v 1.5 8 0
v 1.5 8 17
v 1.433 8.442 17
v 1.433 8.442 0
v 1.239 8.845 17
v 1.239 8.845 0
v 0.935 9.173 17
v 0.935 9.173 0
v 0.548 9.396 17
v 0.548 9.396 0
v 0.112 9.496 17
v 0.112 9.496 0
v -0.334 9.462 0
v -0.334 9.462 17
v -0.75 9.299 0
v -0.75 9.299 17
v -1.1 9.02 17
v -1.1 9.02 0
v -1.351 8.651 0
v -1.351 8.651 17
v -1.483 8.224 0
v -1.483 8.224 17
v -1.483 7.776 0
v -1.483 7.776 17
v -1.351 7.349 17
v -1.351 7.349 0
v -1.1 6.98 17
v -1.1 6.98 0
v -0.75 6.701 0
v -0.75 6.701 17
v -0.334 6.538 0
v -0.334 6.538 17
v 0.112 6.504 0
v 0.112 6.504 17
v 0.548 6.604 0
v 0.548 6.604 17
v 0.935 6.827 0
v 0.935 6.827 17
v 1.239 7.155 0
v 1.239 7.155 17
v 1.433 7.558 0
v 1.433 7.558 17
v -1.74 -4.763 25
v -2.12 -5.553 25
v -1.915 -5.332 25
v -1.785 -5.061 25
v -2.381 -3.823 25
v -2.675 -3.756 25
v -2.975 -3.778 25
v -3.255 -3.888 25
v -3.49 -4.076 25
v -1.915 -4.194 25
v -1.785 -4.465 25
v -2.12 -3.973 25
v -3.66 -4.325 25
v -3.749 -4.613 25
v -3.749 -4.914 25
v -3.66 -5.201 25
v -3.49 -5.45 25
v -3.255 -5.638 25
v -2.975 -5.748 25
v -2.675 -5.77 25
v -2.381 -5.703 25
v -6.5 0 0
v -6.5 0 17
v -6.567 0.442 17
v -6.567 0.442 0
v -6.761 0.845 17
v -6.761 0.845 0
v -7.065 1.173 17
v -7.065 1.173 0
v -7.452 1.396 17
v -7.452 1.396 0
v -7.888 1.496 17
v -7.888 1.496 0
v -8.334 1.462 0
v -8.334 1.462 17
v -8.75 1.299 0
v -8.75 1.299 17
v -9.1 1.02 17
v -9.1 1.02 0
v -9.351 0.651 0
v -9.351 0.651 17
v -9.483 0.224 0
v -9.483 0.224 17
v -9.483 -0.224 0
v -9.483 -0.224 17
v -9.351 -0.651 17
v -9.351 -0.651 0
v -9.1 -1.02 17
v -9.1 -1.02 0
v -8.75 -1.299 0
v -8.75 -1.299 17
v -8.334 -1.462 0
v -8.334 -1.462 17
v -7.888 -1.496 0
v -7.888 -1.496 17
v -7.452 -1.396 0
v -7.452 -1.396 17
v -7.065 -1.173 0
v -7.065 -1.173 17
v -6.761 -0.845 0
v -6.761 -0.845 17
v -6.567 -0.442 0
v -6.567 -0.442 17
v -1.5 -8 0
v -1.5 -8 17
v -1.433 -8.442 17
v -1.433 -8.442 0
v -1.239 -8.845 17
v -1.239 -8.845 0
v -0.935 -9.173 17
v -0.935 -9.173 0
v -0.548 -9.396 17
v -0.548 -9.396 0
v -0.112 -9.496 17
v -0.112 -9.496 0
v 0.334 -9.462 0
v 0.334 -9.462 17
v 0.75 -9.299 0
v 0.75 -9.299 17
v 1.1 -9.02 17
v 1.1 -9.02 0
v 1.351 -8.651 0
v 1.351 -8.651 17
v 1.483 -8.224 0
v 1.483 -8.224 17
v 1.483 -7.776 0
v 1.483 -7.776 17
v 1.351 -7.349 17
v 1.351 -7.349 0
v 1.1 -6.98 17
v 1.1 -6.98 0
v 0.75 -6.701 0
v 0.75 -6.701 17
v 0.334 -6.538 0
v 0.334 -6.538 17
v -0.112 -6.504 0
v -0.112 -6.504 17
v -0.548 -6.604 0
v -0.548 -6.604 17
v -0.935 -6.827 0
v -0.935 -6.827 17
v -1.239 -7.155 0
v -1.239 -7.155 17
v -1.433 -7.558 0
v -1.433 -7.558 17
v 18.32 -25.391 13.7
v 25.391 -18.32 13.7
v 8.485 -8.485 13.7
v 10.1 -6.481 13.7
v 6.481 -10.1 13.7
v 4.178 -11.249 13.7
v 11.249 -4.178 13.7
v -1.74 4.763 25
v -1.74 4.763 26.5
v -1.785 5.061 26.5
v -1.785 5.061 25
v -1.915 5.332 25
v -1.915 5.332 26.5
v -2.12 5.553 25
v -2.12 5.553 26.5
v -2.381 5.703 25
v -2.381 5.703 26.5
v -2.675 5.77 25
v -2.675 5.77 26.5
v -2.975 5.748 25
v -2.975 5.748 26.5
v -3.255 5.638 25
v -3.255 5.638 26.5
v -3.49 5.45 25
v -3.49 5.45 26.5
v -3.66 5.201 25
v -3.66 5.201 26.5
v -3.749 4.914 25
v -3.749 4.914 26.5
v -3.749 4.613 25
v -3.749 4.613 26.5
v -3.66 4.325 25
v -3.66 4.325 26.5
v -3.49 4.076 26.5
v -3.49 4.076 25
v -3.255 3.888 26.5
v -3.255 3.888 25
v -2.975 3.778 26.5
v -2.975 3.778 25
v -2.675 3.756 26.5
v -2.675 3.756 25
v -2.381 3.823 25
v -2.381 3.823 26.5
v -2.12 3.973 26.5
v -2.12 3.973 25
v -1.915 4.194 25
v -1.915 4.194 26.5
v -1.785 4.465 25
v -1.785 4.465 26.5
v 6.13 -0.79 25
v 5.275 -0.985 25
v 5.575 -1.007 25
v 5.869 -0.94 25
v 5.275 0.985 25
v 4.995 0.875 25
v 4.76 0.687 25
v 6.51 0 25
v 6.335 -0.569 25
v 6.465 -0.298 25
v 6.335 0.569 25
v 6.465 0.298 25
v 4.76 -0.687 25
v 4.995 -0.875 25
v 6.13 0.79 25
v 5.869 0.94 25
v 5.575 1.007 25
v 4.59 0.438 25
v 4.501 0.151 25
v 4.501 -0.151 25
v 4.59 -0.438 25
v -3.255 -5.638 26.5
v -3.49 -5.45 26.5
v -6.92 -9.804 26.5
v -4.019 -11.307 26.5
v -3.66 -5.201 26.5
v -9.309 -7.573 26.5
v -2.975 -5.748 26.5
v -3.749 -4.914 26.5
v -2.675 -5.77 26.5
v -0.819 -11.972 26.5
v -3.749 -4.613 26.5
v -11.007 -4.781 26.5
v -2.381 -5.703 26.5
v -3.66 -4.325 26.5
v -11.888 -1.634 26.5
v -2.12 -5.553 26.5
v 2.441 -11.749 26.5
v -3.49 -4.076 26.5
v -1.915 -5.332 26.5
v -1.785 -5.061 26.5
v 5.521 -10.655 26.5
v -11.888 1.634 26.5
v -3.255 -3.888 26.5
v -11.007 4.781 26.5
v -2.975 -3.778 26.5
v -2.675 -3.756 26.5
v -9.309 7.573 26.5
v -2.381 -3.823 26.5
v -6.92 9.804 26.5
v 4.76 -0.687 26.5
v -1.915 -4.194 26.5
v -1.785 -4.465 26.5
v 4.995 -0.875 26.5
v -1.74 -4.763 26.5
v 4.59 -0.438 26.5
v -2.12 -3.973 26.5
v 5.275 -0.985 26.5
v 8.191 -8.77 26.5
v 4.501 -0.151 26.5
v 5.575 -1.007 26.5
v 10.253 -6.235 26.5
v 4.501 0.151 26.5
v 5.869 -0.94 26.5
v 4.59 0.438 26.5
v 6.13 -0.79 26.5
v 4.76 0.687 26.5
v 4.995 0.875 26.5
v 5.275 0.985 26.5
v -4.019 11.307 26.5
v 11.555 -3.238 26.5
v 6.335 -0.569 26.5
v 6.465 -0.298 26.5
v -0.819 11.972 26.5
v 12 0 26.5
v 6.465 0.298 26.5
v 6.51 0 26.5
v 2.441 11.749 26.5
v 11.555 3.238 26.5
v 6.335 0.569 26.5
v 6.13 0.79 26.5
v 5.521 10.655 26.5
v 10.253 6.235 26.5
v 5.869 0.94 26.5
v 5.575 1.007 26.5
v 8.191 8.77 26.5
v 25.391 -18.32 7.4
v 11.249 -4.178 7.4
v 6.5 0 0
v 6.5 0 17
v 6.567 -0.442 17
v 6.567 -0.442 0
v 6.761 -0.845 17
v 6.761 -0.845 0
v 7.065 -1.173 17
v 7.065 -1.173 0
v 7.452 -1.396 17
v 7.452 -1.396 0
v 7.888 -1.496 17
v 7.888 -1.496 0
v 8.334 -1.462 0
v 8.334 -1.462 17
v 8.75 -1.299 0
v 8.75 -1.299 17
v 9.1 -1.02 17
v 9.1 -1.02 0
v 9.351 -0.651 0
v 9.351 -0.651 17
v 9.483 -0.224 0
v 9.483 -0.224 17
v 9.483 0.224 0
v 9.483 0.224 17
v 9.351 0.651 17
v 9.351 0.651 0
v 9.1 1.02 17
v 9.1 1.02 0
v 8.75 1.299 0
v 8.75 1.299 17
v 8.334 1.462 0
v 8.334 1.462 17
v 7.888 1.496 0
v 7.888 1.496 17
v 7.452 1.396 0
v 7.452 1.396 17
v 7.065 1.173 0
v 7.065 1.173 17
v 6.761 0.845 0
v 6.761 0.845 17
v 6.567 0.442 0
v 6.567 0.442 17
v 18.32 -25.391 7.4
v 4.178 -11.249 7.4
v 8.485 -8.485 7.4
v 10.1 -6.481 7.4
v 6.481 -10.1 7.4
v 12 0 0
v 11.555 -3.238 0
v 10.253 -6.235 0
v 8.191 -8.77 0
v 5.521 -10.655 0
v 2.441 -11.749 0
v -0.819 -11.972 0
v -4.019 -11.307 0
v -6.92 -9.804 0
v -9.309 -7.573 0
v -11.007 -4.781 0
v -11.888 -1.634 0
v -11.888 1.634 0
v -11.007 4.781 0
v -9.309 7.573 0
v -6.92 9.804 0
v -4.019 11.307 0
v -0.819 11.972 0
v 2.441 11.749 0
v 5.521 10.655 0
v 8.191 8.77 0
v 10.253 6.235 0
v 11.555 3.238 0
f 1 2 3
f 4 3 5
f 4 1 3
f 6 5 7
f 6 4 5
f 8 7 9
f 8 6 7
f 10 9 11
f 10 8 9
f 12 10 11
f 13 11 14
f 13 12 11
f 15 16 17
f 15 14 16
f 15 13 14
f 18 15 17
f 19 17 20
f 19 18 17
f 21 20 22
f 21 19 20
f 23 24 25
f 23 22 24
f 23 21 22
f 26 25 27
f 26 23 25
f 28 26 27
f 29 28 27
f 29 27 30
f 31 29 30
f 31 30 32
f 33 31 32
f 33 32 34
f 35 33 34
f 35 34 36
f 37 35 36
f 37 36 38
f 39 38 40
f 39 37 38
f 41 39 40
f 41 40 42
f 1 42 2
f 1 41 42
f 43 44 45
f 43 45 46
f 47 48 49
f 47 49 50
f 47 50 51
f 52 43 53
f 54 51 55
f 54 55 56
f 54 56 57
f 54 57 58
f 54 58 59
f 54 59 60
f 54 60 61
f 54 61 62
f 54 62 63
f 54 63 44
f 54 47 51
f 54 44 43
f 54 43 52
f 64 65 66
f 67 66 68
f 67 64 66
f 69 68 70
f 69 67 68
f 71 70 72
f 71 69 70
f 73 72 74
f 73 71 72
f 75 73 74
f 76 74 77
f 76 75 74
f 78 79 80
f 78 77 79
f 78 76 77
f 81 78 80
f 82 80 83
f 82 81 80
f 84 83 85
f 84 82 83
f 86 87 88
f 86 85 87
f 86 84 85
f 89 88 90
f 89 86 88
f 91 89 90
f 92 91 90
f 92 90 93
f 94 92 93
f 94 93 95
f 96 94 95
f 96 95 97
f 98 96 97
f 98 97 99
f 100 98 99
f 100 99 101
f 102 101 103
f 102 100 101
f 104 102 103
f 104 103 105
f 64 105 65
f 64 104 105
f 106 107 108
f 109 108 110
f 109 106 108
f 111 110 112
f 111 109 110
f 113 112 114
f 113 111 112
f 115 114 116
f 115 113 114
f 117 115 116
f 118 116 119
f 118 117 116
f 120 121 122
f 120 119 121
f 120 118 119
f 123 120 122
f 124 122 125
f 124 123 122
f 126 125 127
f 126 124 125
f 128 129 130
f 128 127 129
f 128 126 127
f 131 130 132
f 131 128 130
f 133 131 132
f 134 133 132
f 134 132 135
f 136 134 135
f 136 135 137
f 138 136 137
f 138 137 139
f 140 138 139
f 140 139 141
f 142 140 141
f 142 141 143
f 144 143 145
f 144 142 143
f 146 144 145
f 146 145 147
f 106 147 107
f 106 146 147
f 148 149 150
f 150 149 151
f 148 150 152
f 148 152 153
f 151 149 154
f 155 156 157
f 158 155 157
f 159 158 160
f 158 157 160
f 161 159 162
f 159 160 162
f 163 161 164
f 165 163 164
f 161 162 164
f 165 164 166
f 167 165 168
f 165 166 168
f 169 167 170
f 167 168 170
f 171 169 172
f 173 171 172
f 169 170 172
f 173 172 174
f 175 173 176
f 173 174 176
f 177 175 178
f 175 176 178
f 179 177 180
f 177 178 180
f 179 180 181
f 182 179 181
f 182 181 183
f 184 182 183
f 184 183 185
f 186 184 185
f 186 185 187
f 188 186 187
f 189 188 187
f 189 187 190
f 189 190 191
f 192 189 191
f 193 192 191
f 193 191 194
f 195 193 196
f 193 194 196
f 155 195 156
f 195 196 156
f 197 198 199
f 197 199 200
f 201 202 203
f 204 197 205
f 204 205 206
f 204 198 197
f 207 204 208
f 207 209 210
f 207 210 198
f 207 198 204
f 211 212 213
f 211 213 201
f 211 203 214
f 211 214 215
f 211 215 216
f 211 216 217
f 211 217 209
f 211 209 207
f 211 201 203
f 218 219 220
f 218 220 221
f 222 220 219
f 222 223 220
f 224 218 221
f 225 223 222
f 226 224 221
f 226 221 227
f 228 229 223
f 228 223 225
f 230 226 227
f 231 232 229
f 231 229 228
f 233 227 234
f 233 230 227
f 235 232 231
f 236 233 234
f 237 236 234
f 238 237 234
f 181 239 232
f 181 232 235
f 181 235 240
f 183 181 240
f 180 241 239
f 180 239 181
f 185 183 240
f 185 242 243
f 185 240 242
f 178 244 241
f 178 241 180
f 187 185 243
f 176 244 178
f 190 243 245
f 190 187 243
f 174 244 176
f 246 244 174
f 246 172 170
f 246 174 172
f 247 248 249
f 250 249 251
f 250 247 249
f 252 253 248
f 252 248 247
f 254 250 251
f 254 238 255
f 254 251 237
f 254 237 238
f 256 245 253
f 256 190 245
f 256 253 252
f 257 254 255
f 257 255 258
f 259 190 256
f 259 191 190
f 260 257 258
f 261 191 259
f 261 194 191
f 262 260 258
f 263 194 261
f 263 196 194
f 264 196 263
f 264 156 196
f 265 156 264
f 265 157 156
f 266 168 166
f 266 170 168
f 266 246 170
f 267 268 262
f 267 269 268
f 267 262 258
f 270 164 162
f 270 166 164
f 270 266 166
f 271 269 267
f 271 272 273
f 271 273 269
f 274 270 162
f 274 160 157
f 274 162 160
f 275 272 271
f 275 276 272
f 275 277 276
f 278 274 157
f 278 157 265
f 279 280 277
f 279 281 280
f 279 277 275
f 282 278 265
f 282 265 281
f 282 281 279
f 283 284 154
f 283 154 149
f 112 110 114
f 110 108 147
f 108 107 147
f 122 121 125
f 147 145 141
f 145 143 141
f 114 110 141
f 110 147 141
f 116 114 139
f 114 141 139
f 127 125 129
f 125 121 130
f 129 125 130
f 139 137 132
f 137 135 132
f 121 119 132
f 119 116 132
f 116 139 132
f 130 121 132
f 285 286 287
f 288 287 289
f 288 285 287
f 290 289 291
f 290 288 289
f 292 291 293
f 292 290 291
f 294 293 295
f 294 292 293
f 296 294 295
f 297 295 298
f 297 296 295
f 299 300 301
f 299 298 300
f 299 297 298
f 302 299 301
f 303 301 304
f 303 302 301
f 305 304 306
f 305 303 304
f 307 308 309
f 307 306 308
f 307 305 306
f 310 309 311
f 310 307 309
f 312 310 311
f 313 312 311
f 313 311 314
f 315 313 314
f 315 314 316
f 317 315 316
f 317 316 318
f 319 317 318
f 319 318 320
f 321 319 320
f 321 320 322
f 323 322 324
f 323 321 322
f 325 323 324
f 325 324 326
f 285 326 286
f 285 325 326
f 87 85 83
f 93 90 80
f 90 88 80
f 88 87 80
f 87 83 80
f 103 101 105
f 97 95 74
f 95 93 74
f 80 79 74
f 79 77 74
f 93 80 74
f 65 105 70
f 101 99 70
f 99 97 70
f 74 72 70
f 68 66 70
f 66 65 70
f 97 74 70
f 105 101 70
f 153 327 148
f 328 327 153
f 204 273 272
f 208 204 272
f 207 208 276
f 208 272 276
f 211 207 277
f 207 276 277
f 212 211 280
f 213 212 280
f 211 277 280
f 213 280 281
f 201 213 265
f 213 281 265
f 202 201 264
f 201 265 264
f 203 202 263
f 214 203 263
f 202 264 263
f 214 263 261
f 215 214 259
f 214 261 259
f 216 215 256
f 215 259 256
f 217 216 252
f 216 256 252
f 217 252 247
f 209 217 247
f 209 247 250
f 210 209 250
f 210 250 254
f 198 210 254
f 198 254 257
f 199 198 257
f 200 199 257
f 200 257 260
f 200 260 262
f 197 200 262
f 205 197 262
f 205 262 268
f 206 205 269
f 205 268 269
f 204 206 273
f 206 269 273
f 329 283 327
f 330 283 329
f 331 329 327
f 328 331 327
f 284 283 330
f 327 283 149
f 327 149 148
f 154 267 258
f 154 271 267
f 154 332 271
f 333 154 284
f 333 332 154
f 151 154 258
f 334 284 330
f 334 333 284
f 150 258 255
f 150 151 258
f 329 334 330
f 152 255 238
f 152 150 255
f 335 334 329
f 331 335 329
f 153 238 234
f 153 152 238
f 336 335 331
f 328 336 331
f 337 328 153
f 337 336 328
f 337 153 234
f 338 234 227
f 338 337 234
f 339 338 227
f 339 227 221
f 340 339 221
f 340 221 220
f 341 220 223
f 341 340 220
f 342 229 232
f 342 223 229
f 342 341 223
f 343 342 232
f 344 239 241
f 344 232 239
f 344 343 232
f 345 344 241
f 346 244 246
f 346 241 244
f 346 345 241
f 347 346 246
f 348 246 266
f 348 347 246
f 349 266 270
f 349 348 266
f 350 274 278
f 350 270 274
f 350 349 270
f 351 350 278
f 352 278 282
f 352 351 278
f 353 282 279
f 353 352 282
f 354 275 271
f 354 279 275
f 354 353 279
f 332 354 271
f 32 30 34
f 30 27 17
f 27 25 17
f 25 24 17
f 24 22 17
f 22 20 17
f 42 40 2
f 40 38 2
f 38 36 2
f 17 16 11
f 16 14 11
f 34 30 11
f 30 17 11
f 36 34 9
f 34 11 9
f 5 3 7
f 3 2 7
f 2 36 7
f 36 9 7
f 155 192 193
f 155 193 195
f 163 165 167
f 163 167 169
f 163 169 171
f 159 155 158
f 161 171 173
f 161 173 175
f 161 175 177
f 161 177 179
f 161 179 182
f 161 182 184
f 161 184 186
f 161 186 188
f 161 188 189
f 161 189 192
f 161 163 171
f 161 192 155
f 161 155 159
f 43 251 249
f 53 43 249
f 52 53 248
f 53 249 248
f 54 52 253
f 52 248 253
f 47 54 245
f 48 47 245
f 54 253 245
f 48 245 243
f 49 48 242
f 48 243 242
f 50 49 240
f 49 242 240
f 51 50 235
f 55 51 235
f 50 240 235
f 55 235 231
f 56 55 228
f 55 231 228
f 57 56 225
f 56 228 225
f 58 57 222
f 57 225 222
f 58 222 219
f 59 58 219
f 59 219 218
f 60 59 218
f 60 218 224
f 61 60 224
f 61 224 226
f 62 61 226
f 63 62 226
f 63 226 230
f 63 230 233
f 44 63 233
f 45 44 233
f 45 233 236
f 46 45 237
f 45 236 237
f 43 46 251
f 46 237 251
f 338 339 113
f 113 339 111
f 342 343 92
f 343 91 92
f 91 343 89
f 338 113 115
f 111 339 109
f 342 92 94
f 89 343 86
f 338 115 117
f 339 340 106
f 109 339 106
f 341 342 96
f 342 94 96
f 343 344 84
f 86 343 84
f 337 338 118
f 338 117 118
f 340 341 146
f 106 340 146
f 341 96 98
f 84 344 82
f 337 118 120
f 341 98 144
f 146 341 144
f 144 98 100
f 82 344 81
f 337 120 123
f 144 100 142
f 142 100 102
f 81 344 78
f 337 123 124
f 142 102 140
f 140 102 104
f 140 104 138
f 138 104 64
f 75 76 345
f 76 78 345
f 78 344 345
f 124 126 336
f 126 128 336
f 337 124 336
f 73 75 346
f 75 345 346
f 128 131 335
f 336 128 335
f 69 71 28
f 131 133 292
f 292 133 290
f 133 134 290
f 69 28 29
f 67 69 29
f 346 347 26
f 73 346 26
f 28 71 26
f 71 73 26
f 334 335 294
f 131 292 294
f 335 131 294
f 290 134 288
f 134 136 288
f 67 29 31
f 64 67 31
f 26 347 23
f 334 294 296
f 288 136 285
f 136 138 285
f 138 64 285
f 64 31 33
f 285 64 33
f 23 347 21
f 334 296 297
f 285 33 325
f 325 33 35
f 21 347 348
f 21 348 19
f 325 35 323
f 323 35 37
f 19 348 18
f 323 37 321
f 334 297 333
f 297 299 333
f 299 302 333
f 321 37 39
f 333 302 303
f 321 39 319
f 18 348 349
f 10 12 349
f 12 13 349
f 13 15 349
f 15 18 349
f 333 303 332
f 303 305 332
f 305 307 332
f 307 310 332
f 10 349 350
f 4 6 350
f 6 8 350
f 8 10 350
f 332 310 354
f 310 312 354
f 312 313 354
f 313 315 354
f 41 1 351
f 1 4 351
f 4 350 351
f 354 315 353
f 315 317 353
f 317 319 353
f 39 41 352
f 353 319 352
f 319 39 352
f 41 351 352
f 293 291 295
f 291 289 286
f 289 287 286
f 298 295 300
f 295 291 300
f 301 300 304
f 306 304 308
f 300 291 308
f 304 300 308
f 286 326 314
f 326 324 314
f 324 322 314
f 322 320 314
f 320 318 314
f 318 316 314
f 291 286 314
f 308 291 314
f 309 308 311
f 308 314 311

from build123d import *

# Parameters (mm, degrees)
SKETCH_1_R          = 12
SKETCH_1_R_2        = 1.5
EXTRUDE_1_DEPTH     = 28
SKETCH_2_R          = 20
EXTRUDE_2_DEPTH     = 11
EXTRUDE_START       = -7.4
EXTRUDE_3_DEPTH     = 6.3
SKETCH_4_R          = 20
SKETCH_4_R_2        = 12
CUT_EXTRUDE_1_DEPTH = 39
CUT_EXTRUDE_START   = -1.5
SKETCH_5_R          = 12
CUT_EXTRUDE_2_DEPTH = 1.5
SKETCH_6_R          = 1.01
CUT_EXTRUDE_3_DEPTH = 1.5


with BuildPart() as part:
    # 草图1 → 凸台-拉伸1 (new body)
    with BuildSketch(Plane.XY):
        Circle(SKETCH_1_R)
        with Locations((-8, 0)):
            Circle(SKETCH_1_R_2, mode=Mode.SUBTRACT)
        with Locations(Location((8, 0, 0), (0, 0, 180))):
            Circle(SKETCH_1_R_2, mode=Mode.SUBTRACT)
        with Locations((0, 8)):
            Circle(SKETCH_1_R_2, mode=Mode.SUBTRACT)
        with Locations(Location((0, -8, 0), (0, 0, 180))):
            Circle(SKETCH_1_R_2, mode=Mode.SUBTRACT)
    extrude(amount=EXTRUDE_1_DEPTH)

    # 草图2 → 凸台-拉伸2 (add)
    with BuildSketch(Plane.XY.offset(28)):
        Circle(SKETCH_2_R)
    extrude(amount=-EXTRUDE_2_DEPTH)

    # 草图3 → 凸台-拉伸3 (add)
    with BuildSketch(Plane(origin=(0, 0, 0), x_dir=(-1, 0, 0), z_dir=(0, 0, -1)).offset(EXTRUDE_START)):
        with BuildLine():
            ThreePointArc((-4.178090404, -11.249158216), (-8.485281374, -8.485281374), (-11.249158216, -4.178090404))
            Line((-11.249158216, -4.178090404), (-25.39129384, -18.320226028))
            Line((-25.39129384, -18.320226028), (-18.320226028, -25.39129384))
            Line((-18.320226028, -25.39129384), (-4.178090404, -11.249158216))
        make_face()
    extrude(amount=-EXTRUDE_3_DEPTH)

    # 草图4 → 切除-拉伸1 (cut)
    with BuildSketch(Plane(origin=(0, 0, 17), x_dir=(-1, 0, 0), z_dir=(0, 0, -1))):
        Circle(SKETCH_4_R)
        with Locations(Location((0, 0, 0), (0, 0, 180))):
            Circle(SKETCH_4_R_2, mode=Mode.SUBTRACT)
    extrude(amount=-CUT_EXTRUDE_1_DEPTH, mode=Mode.SUBTRACT)

    # 草图5 → 切除-拉伸2 (cut)
    with BuildSketch(Plane.XY.offset(28).offset(CUT_EXTRUDE_START)):
        Circle(SKETCH_5_R)
    extrude(amount=CUT_EXTRUDE_2_DEPTH, mode=Mode.SUBTRACT)

    # 草图6 → 切除-拉伸3 (cut)
    with BuildSketch(Plane.XY.offset(26.5)):
        with Locations((5.5, 0)):
            Circle(SKETCH_6_R)
        with Locations((-2.75, -4.763139721)):
            Circle(SKETCH_6_R)
        with Locations((-2.75, 4.763139721)):
            Circle(SKETCH_6_R)
    extrude(amount=-CUT_EXTRUDE_3_DEPTH, mode=Mode.SUBTRACT)


solid = part.part
